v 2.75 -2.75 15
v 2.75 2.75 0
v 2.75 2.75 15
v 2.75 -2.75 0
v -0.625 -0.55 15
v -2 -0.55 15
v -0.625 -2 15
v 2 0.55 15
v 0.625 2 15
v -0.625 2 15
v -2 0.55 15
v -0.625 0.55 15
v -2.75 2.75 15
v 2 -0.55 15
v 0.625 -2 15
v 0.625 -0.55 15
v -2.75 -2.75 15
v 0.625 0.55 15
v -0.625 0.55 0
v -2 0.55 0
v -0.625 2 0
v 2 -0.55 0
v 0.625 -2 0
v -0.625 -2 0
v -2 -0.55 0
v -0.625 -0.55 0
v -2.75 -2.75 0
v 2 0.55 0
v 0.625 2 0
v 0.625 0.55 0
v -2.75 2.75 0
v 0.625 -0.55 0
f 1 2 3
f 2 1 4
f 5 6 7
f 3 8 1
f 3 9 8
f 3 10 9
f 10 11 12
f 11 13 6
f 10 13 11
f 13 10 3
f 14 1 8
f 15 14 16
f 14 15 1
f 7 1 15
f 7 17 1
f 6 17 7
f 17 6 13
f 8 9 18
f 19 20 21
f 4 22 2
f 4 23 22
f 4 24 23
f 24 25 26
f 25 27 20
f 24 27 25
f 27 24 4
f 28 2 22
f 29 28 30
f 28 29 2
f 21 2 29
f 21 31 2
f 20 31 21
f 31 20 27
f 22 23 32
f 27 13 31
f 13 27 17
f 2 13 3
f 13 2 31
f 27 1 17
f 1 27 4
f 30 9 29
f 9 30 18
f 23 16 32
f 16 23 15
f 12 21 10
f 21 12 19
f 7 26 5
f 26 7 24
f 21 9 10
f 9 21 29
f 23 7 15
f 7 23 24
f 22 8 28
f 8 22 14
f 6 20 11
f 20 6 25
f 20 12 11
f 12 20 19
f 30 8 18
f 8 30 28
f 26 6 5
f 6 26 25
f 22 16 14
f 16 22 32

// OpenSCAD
$fs = 0.1;
stem_w = 5.5;
stem_d = 5.5;
stem_h = 15;
stem_cross_length = 4.0;
stem_cross_w1= 1.25;
stem_cross_w2 = 1.10;

module create_stem (w, d, h, cross_length, cross_w1, cross_w2) {
    translate([0, 0, h / 2])
        difference () {
            cube([w, d, h], center = true);
            cube([cross_w1, cross_length, h], center = true);
            cube([cross_length, cross_w2, h], center = true);
        }
}
create_stem(w=stem_w, d=stem_d, h=stem_h, cross_length=stem_cross_length, cross_w1=stem_cross_w1, cross_w2=stem_cross_w2);    
